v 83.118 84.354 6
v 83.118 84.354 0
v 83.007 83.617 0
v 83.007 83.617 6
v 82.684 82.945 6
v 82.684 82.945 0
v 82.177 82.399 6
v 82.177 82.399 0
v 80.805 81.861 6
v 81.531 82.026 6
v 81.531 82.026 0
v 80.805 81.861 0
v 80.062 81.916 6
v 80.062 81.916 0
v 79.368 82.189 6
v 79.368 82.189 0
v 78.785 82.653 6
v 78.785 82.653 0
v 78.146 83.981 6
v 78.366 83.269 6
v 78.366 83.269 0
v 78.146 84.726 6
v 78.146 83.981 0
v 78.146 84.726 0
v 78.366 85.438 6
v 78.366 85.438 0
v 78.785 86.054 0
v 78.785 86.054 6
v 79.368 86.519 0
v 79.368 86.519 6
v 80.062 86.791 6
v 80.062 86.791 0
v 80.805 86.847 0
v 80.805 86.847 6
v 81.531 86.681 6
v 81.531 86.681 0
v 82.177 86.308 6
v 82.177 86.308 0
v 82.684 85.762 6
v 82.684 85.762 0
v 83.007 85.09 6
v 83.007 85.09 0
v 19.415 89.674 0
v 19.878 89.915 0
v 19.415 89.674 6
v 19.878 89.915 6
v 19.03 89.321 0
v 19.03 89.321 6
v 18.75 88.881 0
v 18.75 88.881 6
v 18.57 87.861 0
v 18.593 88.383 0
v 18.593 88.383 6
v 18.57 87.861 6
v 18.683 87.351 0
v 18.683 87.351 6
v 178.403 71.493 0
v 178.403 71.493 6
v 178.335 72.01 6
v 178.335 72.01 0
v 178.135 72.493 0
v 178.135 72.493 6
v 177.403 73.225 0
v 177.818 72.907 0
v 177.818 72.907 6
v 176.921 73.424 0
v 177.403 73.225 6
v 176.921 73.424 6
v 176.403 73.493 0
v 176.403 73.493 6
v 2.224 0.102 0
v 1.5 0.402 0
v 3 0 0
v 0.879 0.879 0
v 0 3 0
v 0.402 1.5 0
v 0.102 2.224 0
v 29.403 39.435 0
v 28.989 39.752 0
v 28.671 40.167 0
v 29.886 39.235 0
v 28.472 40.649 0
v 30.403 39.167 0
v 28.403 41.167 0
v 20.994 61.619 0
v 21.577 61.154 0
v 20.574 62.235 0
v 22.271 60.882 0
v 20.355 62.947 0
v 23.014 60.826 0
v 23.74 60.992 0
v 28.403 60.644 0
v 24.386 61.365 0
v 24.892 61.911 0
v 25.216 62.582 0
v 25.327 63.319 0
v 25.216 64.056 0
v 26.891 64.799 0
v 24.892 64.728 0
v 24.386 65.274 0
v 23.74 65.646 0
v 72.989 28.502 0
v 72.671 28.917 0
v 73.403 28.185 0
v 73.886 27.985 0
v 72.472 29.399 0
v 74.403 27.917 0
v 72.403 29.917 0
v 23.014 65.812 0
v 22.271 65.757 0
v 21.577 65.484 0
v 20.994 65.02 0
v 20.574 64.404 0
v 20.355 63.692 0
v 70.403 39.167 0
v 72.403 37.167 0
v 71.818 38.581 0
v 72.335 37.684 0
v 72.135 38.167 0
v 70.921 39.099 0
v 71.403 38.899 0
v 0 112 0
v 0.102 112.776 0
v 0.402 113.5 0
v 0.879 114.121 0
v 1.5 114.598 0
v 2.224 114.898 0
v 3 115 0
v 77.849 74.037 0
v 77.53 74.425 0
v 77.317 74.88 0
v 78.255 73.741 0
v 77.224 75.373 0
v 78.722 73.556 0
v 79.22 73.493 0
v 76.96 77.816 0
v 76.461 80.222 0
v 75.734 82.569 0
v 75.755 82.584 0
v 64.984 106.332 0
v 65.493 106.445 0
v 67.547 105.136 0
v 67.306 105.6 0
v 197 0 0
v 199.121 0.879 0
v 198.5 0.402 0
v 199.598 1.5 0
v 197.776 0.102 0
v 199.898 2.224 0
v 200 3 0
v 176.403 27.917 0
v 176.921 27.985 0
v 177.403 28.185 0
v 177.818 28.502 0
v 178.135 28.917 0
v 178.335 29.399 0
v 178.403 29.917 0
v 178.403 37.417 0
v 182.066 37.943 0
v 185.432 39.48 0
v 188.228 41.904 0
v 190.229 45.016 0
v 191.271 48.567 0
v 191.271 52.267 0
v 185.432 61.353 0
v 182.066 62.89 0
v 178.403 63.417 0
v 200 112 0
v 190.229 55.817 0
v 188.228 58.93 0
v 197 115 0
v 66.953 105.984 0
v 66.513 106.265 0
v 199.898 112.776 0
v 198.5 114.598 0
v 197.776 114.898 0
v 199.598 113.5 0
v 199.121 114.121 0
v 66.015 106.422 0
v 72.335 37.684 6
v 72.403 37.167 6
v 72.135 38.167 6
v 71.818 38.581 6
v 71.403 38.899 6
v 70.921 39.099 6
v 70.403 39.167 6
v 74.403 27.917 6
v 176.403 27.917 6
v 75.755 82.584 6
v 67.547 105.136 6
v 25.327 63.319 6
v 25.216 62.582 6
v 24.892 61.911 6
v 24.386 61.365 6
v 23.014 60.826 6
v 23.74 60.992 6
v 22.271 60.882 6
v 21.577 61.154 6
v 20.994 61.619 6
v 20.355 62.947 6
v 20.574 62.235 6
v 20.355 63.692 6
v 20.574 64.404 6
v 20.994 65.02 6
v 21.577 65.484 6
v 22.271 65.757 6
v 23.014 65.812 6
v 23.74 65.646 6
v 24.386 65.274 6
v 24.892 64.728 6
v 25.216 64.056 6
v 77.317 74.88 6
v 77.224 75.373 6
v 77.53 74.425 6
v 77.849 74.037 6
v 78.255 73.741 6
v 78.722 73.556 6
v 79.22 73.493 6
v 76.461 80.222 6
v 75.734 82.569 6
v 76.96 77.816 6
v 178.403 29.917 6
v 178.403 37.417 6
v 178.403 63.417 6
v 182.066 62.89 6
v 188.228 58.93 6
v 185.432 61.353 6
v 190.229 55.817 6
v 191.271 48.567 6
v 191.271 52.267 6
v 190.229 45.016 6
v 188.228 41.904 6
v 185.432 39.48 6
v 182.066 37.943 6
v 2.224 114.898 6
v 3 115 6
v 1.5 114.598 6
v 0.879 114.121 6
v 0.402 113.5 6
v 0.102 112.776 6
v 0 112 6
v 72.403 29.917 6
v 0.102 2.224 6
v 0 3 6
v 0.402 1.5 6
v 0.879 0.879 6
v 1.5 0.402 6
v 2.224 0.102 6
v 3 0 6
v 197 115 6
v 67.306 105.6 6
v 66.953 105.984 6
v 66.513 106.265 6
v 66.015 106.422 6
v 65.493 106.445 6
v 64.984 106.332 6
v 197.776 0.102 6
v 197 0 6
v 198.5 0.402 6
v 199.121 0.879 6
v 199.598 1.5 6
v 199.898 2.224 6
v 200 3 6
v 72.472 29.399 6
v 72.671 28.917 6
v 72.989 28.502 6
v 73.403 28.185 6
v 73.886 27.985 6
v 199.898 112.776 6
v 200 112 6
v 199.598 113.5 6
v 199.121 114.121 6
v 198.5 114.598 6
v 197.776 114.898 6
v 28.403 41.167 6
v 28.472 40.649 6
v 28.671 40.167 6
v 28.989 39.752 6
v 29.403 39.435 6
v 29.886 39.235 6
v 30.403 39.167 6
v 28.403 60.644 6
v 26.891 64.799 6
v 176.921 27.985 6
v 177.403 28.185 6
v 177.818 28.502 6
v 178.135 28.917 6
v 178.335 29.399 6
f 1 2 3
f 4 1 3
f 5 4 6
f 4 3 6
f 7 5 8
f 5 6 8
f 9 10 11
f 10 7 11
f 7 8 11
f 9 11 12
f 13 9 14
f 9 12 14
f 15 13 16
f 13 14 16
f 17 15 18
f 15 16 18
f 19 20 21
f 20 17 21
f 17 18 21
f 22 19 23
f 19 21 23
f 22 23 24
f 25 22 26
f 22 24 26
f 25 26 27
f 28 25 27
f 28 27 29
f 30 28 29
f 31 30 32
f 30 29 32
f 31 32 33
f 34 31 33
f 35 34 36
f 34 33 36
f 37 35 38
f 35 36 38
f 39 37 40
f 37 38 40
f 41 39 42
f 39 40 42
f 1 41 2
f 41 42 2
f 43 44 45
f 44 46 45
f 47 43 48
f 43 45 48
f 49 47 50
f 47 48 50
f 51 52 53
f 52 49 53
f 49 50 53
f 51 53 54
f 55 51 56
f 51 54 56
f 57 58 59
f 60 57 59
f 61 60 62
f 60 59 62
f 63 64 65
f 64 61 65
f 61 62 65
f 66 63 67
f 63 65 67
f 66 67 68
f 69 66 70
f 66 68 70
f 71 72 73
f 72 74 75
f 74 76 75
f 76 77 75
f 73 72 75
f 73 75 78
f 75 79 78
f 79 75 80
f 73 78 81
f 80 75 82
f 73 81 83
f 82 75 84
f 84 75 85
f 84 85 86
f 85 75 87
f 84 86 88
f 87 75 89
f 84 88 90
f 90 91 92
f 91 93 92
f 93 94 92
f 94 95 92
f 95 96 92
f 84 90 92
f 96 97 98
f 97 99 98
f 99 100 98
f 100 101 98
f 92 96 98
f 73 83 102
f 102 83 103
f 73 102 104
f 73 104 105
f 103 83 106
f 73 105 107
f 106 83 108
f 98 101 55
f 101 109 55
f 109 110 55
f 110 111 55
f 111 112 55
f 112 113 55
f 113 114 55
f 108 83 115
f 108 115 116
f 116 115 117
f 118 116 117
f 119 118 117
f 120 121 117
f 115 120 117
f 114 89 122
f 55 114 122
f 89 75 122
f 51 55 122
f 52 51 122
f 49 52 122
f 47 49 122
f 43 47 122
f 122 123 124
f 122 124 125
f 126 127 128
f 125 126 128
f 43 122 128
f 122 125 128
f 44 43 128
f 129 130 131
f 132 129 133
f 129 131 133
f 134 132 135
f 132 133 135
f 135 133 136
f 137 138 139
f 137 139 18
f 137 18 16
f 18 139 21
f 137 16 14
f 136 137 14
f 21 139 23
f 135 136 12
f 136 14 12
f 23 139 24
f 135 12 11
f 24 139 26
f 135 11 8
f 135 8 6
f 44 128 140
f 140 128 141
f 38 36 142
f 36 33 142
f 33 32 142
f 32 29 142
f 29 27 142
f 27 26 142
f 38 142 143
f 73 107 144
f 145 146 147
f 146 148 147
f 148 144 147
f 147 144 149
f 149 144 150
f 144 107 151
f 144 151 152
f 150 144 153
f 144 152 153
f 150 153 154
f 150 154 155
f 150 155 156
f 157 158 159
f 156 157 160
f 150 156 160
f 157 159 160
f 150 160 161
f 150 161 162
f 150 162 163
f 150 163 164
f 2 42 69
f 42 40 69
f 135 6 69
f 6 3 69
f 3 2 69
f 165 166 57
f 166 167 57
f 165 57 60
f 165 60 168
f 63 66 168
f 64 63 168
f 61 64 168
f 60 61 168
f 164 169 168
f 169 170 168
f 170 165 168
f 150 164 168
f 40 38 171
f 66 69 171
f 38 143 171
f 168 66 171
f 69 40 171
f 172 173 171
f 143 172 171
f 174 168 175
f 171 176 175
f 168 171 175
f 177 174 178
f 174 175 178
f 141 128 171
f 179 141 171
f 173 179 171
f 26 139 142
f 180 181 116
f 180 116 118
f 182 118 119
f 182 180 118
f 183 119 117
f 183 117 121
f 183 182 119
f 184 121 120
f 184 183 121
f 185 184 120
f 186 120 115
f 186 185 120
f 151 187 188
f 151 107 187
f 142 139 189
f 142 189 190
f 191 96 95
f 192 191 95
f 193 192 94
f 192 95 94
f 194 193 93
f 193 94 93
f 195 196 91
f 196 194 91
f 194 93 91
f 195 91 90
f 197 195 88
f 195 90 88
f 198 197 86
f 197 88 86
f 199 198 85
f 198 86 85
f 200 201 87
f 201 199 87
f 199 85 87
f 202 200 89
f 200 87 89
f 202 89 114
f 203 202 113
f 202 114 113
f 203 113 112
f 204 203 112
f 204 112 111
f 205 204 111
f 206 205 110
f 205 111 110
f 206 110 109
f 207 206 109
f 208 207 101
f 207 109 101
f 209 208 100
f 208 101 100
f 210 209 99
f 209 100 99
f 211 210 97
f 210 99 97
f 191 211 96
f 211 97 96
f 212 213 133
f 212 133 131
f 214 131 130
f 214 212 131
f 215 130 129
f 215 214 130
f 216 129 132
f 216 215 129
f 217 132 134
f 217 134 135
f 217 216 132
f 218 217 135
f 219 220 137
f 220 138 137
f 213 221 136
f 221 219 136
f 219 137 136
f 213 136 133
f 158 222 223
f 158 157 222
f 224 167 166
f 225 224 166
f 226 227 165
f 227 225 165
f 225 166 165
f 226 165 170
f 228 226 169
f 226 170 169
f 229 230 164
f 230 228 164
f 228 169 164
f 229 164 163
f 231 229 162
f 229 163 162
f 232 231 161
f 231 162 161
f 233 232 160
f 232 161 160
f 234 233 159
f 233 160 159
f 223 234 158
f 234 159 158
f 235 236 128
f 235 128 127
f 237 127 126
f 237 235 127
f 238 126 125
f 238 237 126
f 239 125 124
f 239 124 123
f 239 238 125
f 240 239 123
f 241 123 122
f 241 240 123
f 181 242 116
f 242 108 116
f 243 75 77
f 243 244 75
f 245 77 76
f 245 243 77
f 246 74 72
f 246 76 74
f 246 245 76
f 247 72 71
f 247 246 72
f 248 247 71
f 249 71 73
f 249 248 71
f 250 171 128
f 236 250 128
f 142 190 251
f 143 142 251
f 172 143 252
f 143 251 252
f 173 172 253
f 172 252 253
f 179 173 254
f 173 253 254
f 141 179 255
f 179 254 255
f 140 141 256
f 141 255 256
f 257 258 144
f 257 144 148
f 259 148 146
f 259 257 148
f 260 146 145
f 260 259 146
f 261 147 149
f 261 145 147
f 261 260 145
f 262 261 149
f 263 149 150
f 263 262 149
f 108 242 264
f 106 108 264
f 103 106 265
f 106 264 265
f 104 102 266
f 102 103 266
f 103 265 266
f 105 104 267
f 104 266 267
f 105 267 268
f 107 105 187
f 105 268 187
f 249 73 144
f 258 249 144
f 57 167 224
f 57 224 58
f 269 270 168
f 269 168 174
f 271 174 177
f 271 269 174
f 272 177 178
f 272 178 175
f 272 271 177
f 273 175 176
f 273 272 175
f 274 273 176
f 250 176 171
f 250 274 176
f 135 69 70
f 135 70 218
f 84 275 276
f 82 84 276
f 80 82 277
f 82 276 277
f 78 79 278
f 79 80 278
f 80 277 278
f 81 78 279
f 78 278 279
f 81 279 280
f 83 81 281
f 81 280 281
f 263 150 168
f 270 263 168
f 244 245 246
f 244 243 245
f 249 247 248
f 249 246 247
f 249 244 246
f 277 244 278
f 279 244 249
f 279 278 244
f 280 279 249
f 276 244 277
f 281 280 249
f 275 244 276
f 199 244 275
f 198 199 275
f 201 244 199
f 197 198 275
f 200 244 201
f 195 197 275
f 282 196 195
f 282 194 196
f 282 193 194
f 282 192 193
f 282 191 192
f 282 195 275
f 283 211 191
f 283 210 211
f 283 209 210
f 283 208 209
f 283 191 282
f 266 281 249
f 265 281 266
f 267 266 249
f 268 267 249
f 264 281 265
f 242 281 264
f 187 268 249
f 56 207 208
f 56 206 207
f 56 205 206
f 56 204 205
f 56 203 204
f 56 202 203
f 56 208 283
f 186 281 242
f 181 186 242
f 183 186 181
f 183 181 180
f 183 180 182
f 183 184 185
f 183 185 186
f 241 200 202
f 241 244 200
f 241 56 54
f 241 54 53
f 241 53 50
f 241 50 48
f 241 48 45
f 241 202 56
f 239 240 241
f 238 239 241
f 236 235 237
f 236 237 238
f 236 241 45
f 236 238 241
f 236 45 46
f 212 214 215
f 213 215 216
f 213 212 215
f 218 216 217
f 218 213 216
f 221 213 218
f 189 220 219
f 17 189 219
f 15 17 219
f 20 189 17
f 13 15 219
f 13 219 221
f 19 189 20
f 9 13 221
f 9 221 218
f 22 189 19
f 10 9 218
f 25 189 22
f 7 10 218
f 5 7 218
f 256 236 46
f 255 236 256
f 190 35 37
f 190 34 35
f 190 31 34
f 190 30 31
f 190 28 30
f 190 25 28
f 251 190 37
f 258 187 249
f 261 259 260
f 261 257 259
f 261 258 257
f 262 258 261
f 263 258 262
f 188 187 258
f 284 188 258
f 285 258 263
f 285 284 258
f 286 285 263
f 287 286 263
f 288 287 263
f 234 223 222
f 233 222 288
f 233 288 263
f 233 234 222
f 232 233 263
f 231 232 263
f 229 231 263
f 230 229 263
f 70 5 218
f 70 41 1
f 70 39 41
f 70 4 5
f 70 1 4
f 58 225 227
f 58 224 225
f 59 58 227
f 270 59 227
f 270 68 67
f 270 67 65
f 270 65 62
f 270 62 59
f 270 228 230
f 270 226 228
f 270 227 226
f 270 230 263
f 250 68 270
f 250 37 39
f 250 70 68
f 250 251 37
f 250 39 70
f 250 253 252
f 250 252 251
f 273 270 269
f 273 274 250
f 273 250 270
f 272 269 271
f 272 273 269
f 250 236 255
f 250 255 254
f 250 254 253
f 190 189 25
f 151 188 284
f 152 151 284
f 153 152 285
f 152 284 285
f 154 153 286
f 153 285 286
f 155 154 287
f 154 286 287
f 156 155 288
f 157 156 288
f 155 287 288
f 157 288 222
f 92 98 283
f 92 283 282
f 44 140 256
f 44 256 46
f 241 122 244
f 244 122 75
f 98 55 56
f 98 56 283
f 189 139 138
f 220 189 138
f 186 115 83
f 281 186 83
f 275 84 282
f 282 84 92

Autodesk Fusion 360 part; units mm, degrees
sketch "Sketch1" plane through (0, 0, 0) normal (0, 0, 1) x (1, 0, 0)
  line L0 (72.4034, 27.9167) -> (178.4034, 27.9167)
  line L1 (72.4034, 27.9167) -> (72.4034, 39.1667)
  line L2 (72.4034, 39.1667) -> (28.4034, 39.1667)
  line L3 (28.4034, 39.1667) -> (28.4034, 60.6444)
  line L4 (51.7694, 73.8535) -> (80.618, 84.3536) construction
  line L5 (51.7694, 73.8535) -> (87.8768, 73.8535) construction
  line L6 (80.618, 84.3536) -> (22.8269, 63.3193) construction
  line L7 (80.618, 84.3536) -> (137.5254, 84.3536) construction
  line L8 (178.4034, 73.4926) -> (77.2668, 73.4926)
  line L9 (72.4034, 39.1667) -> (72.4034, 27.9167)
  arc A0 (178.4034, 37.4167) -> (178.4034, 63.4167) centre (178.4034, 50.4167) ccw
  line L10 (178.4034, 27.9167) -> (178.4034, 37.4167)
  line L11 (178.4034, 63.4167) -> (178.4034, 73.4926)
  line L12 (0, 0) -> (200, 0)
  line L13 (200, 0) -> (200, 115)
  line L14 (200, 115) -> (0, 115)
  line L15 (0, 115) -> (0, 0)
  circle A1 centre (80.618, 84.3536) radius 2.5
  circle A2 centre (22.8269, 63.3193) radius 2.5
  line L16 (178.4034, 73.4926) -> (178.4034, 27.9167) construction
  line L17 (178.4034, 50.4167) -> (28.4034, 50.4167)
  line L18 (75.7554, 82.5838) -> (66.8629, 107.0158)
  line L19 (75.7554, 82.5838) -> (66.8629, 107.0158)
  line L20 (66.8629, 107.0158) -> (17.9989, 89.2307)
  line L21 (17.9989, 89.2307) -> (26.8914, 64.7987)
  line L22 (75.7554, 82.5838) -> (75.7337, 82.5692)
  arc A3 (77.2668, 73.4926) -> (75.7316, 82.5751) centre (51.7694, 73.8535) ccw
  line L23 (26.8914, 64.7987) -> (28.4034, 60.6444)
  dimension "d3" = 106
  dimension "d5" = 26
  dimension "d8" = 11.25
  dimension "d9" = 44
  dimension "d11" = 30.7
  dimension "d12" = 20
  dimension "d14" = 61.5
  dimension "d15" = 200
  dimension "d16" = 115
  dimension "d17" = 5
  dimension "d18" = 5
  dimension "d27" = 26
  dimension "d28" = 26
  dimension "d29" = 52
extrude "Extrude3" add sketch "Sketch1" along normal blind 6
fillet "Fillet3" radius 3 1 edges at (200, 0, 3)
fillet "Fillet4" radius 3 3 edges at (0, 0, 3) (0, 115, 3) (200, 115, 3)
fillet "Fillet5" radius 2 7 edges at (17.9989, 89.2307, 3) (66.8629, 107.0158, 3) (77.2668, 73.4926, 3) (28.4034, 39.1667, 3) (72.4034, 27.9167, 3) (178.4034, 27.9167, 3) (178.4034, 73.4926, 3)
fillet "Fillet6" radius 2 1 edges at (72.4034, 39.1667, 3)
